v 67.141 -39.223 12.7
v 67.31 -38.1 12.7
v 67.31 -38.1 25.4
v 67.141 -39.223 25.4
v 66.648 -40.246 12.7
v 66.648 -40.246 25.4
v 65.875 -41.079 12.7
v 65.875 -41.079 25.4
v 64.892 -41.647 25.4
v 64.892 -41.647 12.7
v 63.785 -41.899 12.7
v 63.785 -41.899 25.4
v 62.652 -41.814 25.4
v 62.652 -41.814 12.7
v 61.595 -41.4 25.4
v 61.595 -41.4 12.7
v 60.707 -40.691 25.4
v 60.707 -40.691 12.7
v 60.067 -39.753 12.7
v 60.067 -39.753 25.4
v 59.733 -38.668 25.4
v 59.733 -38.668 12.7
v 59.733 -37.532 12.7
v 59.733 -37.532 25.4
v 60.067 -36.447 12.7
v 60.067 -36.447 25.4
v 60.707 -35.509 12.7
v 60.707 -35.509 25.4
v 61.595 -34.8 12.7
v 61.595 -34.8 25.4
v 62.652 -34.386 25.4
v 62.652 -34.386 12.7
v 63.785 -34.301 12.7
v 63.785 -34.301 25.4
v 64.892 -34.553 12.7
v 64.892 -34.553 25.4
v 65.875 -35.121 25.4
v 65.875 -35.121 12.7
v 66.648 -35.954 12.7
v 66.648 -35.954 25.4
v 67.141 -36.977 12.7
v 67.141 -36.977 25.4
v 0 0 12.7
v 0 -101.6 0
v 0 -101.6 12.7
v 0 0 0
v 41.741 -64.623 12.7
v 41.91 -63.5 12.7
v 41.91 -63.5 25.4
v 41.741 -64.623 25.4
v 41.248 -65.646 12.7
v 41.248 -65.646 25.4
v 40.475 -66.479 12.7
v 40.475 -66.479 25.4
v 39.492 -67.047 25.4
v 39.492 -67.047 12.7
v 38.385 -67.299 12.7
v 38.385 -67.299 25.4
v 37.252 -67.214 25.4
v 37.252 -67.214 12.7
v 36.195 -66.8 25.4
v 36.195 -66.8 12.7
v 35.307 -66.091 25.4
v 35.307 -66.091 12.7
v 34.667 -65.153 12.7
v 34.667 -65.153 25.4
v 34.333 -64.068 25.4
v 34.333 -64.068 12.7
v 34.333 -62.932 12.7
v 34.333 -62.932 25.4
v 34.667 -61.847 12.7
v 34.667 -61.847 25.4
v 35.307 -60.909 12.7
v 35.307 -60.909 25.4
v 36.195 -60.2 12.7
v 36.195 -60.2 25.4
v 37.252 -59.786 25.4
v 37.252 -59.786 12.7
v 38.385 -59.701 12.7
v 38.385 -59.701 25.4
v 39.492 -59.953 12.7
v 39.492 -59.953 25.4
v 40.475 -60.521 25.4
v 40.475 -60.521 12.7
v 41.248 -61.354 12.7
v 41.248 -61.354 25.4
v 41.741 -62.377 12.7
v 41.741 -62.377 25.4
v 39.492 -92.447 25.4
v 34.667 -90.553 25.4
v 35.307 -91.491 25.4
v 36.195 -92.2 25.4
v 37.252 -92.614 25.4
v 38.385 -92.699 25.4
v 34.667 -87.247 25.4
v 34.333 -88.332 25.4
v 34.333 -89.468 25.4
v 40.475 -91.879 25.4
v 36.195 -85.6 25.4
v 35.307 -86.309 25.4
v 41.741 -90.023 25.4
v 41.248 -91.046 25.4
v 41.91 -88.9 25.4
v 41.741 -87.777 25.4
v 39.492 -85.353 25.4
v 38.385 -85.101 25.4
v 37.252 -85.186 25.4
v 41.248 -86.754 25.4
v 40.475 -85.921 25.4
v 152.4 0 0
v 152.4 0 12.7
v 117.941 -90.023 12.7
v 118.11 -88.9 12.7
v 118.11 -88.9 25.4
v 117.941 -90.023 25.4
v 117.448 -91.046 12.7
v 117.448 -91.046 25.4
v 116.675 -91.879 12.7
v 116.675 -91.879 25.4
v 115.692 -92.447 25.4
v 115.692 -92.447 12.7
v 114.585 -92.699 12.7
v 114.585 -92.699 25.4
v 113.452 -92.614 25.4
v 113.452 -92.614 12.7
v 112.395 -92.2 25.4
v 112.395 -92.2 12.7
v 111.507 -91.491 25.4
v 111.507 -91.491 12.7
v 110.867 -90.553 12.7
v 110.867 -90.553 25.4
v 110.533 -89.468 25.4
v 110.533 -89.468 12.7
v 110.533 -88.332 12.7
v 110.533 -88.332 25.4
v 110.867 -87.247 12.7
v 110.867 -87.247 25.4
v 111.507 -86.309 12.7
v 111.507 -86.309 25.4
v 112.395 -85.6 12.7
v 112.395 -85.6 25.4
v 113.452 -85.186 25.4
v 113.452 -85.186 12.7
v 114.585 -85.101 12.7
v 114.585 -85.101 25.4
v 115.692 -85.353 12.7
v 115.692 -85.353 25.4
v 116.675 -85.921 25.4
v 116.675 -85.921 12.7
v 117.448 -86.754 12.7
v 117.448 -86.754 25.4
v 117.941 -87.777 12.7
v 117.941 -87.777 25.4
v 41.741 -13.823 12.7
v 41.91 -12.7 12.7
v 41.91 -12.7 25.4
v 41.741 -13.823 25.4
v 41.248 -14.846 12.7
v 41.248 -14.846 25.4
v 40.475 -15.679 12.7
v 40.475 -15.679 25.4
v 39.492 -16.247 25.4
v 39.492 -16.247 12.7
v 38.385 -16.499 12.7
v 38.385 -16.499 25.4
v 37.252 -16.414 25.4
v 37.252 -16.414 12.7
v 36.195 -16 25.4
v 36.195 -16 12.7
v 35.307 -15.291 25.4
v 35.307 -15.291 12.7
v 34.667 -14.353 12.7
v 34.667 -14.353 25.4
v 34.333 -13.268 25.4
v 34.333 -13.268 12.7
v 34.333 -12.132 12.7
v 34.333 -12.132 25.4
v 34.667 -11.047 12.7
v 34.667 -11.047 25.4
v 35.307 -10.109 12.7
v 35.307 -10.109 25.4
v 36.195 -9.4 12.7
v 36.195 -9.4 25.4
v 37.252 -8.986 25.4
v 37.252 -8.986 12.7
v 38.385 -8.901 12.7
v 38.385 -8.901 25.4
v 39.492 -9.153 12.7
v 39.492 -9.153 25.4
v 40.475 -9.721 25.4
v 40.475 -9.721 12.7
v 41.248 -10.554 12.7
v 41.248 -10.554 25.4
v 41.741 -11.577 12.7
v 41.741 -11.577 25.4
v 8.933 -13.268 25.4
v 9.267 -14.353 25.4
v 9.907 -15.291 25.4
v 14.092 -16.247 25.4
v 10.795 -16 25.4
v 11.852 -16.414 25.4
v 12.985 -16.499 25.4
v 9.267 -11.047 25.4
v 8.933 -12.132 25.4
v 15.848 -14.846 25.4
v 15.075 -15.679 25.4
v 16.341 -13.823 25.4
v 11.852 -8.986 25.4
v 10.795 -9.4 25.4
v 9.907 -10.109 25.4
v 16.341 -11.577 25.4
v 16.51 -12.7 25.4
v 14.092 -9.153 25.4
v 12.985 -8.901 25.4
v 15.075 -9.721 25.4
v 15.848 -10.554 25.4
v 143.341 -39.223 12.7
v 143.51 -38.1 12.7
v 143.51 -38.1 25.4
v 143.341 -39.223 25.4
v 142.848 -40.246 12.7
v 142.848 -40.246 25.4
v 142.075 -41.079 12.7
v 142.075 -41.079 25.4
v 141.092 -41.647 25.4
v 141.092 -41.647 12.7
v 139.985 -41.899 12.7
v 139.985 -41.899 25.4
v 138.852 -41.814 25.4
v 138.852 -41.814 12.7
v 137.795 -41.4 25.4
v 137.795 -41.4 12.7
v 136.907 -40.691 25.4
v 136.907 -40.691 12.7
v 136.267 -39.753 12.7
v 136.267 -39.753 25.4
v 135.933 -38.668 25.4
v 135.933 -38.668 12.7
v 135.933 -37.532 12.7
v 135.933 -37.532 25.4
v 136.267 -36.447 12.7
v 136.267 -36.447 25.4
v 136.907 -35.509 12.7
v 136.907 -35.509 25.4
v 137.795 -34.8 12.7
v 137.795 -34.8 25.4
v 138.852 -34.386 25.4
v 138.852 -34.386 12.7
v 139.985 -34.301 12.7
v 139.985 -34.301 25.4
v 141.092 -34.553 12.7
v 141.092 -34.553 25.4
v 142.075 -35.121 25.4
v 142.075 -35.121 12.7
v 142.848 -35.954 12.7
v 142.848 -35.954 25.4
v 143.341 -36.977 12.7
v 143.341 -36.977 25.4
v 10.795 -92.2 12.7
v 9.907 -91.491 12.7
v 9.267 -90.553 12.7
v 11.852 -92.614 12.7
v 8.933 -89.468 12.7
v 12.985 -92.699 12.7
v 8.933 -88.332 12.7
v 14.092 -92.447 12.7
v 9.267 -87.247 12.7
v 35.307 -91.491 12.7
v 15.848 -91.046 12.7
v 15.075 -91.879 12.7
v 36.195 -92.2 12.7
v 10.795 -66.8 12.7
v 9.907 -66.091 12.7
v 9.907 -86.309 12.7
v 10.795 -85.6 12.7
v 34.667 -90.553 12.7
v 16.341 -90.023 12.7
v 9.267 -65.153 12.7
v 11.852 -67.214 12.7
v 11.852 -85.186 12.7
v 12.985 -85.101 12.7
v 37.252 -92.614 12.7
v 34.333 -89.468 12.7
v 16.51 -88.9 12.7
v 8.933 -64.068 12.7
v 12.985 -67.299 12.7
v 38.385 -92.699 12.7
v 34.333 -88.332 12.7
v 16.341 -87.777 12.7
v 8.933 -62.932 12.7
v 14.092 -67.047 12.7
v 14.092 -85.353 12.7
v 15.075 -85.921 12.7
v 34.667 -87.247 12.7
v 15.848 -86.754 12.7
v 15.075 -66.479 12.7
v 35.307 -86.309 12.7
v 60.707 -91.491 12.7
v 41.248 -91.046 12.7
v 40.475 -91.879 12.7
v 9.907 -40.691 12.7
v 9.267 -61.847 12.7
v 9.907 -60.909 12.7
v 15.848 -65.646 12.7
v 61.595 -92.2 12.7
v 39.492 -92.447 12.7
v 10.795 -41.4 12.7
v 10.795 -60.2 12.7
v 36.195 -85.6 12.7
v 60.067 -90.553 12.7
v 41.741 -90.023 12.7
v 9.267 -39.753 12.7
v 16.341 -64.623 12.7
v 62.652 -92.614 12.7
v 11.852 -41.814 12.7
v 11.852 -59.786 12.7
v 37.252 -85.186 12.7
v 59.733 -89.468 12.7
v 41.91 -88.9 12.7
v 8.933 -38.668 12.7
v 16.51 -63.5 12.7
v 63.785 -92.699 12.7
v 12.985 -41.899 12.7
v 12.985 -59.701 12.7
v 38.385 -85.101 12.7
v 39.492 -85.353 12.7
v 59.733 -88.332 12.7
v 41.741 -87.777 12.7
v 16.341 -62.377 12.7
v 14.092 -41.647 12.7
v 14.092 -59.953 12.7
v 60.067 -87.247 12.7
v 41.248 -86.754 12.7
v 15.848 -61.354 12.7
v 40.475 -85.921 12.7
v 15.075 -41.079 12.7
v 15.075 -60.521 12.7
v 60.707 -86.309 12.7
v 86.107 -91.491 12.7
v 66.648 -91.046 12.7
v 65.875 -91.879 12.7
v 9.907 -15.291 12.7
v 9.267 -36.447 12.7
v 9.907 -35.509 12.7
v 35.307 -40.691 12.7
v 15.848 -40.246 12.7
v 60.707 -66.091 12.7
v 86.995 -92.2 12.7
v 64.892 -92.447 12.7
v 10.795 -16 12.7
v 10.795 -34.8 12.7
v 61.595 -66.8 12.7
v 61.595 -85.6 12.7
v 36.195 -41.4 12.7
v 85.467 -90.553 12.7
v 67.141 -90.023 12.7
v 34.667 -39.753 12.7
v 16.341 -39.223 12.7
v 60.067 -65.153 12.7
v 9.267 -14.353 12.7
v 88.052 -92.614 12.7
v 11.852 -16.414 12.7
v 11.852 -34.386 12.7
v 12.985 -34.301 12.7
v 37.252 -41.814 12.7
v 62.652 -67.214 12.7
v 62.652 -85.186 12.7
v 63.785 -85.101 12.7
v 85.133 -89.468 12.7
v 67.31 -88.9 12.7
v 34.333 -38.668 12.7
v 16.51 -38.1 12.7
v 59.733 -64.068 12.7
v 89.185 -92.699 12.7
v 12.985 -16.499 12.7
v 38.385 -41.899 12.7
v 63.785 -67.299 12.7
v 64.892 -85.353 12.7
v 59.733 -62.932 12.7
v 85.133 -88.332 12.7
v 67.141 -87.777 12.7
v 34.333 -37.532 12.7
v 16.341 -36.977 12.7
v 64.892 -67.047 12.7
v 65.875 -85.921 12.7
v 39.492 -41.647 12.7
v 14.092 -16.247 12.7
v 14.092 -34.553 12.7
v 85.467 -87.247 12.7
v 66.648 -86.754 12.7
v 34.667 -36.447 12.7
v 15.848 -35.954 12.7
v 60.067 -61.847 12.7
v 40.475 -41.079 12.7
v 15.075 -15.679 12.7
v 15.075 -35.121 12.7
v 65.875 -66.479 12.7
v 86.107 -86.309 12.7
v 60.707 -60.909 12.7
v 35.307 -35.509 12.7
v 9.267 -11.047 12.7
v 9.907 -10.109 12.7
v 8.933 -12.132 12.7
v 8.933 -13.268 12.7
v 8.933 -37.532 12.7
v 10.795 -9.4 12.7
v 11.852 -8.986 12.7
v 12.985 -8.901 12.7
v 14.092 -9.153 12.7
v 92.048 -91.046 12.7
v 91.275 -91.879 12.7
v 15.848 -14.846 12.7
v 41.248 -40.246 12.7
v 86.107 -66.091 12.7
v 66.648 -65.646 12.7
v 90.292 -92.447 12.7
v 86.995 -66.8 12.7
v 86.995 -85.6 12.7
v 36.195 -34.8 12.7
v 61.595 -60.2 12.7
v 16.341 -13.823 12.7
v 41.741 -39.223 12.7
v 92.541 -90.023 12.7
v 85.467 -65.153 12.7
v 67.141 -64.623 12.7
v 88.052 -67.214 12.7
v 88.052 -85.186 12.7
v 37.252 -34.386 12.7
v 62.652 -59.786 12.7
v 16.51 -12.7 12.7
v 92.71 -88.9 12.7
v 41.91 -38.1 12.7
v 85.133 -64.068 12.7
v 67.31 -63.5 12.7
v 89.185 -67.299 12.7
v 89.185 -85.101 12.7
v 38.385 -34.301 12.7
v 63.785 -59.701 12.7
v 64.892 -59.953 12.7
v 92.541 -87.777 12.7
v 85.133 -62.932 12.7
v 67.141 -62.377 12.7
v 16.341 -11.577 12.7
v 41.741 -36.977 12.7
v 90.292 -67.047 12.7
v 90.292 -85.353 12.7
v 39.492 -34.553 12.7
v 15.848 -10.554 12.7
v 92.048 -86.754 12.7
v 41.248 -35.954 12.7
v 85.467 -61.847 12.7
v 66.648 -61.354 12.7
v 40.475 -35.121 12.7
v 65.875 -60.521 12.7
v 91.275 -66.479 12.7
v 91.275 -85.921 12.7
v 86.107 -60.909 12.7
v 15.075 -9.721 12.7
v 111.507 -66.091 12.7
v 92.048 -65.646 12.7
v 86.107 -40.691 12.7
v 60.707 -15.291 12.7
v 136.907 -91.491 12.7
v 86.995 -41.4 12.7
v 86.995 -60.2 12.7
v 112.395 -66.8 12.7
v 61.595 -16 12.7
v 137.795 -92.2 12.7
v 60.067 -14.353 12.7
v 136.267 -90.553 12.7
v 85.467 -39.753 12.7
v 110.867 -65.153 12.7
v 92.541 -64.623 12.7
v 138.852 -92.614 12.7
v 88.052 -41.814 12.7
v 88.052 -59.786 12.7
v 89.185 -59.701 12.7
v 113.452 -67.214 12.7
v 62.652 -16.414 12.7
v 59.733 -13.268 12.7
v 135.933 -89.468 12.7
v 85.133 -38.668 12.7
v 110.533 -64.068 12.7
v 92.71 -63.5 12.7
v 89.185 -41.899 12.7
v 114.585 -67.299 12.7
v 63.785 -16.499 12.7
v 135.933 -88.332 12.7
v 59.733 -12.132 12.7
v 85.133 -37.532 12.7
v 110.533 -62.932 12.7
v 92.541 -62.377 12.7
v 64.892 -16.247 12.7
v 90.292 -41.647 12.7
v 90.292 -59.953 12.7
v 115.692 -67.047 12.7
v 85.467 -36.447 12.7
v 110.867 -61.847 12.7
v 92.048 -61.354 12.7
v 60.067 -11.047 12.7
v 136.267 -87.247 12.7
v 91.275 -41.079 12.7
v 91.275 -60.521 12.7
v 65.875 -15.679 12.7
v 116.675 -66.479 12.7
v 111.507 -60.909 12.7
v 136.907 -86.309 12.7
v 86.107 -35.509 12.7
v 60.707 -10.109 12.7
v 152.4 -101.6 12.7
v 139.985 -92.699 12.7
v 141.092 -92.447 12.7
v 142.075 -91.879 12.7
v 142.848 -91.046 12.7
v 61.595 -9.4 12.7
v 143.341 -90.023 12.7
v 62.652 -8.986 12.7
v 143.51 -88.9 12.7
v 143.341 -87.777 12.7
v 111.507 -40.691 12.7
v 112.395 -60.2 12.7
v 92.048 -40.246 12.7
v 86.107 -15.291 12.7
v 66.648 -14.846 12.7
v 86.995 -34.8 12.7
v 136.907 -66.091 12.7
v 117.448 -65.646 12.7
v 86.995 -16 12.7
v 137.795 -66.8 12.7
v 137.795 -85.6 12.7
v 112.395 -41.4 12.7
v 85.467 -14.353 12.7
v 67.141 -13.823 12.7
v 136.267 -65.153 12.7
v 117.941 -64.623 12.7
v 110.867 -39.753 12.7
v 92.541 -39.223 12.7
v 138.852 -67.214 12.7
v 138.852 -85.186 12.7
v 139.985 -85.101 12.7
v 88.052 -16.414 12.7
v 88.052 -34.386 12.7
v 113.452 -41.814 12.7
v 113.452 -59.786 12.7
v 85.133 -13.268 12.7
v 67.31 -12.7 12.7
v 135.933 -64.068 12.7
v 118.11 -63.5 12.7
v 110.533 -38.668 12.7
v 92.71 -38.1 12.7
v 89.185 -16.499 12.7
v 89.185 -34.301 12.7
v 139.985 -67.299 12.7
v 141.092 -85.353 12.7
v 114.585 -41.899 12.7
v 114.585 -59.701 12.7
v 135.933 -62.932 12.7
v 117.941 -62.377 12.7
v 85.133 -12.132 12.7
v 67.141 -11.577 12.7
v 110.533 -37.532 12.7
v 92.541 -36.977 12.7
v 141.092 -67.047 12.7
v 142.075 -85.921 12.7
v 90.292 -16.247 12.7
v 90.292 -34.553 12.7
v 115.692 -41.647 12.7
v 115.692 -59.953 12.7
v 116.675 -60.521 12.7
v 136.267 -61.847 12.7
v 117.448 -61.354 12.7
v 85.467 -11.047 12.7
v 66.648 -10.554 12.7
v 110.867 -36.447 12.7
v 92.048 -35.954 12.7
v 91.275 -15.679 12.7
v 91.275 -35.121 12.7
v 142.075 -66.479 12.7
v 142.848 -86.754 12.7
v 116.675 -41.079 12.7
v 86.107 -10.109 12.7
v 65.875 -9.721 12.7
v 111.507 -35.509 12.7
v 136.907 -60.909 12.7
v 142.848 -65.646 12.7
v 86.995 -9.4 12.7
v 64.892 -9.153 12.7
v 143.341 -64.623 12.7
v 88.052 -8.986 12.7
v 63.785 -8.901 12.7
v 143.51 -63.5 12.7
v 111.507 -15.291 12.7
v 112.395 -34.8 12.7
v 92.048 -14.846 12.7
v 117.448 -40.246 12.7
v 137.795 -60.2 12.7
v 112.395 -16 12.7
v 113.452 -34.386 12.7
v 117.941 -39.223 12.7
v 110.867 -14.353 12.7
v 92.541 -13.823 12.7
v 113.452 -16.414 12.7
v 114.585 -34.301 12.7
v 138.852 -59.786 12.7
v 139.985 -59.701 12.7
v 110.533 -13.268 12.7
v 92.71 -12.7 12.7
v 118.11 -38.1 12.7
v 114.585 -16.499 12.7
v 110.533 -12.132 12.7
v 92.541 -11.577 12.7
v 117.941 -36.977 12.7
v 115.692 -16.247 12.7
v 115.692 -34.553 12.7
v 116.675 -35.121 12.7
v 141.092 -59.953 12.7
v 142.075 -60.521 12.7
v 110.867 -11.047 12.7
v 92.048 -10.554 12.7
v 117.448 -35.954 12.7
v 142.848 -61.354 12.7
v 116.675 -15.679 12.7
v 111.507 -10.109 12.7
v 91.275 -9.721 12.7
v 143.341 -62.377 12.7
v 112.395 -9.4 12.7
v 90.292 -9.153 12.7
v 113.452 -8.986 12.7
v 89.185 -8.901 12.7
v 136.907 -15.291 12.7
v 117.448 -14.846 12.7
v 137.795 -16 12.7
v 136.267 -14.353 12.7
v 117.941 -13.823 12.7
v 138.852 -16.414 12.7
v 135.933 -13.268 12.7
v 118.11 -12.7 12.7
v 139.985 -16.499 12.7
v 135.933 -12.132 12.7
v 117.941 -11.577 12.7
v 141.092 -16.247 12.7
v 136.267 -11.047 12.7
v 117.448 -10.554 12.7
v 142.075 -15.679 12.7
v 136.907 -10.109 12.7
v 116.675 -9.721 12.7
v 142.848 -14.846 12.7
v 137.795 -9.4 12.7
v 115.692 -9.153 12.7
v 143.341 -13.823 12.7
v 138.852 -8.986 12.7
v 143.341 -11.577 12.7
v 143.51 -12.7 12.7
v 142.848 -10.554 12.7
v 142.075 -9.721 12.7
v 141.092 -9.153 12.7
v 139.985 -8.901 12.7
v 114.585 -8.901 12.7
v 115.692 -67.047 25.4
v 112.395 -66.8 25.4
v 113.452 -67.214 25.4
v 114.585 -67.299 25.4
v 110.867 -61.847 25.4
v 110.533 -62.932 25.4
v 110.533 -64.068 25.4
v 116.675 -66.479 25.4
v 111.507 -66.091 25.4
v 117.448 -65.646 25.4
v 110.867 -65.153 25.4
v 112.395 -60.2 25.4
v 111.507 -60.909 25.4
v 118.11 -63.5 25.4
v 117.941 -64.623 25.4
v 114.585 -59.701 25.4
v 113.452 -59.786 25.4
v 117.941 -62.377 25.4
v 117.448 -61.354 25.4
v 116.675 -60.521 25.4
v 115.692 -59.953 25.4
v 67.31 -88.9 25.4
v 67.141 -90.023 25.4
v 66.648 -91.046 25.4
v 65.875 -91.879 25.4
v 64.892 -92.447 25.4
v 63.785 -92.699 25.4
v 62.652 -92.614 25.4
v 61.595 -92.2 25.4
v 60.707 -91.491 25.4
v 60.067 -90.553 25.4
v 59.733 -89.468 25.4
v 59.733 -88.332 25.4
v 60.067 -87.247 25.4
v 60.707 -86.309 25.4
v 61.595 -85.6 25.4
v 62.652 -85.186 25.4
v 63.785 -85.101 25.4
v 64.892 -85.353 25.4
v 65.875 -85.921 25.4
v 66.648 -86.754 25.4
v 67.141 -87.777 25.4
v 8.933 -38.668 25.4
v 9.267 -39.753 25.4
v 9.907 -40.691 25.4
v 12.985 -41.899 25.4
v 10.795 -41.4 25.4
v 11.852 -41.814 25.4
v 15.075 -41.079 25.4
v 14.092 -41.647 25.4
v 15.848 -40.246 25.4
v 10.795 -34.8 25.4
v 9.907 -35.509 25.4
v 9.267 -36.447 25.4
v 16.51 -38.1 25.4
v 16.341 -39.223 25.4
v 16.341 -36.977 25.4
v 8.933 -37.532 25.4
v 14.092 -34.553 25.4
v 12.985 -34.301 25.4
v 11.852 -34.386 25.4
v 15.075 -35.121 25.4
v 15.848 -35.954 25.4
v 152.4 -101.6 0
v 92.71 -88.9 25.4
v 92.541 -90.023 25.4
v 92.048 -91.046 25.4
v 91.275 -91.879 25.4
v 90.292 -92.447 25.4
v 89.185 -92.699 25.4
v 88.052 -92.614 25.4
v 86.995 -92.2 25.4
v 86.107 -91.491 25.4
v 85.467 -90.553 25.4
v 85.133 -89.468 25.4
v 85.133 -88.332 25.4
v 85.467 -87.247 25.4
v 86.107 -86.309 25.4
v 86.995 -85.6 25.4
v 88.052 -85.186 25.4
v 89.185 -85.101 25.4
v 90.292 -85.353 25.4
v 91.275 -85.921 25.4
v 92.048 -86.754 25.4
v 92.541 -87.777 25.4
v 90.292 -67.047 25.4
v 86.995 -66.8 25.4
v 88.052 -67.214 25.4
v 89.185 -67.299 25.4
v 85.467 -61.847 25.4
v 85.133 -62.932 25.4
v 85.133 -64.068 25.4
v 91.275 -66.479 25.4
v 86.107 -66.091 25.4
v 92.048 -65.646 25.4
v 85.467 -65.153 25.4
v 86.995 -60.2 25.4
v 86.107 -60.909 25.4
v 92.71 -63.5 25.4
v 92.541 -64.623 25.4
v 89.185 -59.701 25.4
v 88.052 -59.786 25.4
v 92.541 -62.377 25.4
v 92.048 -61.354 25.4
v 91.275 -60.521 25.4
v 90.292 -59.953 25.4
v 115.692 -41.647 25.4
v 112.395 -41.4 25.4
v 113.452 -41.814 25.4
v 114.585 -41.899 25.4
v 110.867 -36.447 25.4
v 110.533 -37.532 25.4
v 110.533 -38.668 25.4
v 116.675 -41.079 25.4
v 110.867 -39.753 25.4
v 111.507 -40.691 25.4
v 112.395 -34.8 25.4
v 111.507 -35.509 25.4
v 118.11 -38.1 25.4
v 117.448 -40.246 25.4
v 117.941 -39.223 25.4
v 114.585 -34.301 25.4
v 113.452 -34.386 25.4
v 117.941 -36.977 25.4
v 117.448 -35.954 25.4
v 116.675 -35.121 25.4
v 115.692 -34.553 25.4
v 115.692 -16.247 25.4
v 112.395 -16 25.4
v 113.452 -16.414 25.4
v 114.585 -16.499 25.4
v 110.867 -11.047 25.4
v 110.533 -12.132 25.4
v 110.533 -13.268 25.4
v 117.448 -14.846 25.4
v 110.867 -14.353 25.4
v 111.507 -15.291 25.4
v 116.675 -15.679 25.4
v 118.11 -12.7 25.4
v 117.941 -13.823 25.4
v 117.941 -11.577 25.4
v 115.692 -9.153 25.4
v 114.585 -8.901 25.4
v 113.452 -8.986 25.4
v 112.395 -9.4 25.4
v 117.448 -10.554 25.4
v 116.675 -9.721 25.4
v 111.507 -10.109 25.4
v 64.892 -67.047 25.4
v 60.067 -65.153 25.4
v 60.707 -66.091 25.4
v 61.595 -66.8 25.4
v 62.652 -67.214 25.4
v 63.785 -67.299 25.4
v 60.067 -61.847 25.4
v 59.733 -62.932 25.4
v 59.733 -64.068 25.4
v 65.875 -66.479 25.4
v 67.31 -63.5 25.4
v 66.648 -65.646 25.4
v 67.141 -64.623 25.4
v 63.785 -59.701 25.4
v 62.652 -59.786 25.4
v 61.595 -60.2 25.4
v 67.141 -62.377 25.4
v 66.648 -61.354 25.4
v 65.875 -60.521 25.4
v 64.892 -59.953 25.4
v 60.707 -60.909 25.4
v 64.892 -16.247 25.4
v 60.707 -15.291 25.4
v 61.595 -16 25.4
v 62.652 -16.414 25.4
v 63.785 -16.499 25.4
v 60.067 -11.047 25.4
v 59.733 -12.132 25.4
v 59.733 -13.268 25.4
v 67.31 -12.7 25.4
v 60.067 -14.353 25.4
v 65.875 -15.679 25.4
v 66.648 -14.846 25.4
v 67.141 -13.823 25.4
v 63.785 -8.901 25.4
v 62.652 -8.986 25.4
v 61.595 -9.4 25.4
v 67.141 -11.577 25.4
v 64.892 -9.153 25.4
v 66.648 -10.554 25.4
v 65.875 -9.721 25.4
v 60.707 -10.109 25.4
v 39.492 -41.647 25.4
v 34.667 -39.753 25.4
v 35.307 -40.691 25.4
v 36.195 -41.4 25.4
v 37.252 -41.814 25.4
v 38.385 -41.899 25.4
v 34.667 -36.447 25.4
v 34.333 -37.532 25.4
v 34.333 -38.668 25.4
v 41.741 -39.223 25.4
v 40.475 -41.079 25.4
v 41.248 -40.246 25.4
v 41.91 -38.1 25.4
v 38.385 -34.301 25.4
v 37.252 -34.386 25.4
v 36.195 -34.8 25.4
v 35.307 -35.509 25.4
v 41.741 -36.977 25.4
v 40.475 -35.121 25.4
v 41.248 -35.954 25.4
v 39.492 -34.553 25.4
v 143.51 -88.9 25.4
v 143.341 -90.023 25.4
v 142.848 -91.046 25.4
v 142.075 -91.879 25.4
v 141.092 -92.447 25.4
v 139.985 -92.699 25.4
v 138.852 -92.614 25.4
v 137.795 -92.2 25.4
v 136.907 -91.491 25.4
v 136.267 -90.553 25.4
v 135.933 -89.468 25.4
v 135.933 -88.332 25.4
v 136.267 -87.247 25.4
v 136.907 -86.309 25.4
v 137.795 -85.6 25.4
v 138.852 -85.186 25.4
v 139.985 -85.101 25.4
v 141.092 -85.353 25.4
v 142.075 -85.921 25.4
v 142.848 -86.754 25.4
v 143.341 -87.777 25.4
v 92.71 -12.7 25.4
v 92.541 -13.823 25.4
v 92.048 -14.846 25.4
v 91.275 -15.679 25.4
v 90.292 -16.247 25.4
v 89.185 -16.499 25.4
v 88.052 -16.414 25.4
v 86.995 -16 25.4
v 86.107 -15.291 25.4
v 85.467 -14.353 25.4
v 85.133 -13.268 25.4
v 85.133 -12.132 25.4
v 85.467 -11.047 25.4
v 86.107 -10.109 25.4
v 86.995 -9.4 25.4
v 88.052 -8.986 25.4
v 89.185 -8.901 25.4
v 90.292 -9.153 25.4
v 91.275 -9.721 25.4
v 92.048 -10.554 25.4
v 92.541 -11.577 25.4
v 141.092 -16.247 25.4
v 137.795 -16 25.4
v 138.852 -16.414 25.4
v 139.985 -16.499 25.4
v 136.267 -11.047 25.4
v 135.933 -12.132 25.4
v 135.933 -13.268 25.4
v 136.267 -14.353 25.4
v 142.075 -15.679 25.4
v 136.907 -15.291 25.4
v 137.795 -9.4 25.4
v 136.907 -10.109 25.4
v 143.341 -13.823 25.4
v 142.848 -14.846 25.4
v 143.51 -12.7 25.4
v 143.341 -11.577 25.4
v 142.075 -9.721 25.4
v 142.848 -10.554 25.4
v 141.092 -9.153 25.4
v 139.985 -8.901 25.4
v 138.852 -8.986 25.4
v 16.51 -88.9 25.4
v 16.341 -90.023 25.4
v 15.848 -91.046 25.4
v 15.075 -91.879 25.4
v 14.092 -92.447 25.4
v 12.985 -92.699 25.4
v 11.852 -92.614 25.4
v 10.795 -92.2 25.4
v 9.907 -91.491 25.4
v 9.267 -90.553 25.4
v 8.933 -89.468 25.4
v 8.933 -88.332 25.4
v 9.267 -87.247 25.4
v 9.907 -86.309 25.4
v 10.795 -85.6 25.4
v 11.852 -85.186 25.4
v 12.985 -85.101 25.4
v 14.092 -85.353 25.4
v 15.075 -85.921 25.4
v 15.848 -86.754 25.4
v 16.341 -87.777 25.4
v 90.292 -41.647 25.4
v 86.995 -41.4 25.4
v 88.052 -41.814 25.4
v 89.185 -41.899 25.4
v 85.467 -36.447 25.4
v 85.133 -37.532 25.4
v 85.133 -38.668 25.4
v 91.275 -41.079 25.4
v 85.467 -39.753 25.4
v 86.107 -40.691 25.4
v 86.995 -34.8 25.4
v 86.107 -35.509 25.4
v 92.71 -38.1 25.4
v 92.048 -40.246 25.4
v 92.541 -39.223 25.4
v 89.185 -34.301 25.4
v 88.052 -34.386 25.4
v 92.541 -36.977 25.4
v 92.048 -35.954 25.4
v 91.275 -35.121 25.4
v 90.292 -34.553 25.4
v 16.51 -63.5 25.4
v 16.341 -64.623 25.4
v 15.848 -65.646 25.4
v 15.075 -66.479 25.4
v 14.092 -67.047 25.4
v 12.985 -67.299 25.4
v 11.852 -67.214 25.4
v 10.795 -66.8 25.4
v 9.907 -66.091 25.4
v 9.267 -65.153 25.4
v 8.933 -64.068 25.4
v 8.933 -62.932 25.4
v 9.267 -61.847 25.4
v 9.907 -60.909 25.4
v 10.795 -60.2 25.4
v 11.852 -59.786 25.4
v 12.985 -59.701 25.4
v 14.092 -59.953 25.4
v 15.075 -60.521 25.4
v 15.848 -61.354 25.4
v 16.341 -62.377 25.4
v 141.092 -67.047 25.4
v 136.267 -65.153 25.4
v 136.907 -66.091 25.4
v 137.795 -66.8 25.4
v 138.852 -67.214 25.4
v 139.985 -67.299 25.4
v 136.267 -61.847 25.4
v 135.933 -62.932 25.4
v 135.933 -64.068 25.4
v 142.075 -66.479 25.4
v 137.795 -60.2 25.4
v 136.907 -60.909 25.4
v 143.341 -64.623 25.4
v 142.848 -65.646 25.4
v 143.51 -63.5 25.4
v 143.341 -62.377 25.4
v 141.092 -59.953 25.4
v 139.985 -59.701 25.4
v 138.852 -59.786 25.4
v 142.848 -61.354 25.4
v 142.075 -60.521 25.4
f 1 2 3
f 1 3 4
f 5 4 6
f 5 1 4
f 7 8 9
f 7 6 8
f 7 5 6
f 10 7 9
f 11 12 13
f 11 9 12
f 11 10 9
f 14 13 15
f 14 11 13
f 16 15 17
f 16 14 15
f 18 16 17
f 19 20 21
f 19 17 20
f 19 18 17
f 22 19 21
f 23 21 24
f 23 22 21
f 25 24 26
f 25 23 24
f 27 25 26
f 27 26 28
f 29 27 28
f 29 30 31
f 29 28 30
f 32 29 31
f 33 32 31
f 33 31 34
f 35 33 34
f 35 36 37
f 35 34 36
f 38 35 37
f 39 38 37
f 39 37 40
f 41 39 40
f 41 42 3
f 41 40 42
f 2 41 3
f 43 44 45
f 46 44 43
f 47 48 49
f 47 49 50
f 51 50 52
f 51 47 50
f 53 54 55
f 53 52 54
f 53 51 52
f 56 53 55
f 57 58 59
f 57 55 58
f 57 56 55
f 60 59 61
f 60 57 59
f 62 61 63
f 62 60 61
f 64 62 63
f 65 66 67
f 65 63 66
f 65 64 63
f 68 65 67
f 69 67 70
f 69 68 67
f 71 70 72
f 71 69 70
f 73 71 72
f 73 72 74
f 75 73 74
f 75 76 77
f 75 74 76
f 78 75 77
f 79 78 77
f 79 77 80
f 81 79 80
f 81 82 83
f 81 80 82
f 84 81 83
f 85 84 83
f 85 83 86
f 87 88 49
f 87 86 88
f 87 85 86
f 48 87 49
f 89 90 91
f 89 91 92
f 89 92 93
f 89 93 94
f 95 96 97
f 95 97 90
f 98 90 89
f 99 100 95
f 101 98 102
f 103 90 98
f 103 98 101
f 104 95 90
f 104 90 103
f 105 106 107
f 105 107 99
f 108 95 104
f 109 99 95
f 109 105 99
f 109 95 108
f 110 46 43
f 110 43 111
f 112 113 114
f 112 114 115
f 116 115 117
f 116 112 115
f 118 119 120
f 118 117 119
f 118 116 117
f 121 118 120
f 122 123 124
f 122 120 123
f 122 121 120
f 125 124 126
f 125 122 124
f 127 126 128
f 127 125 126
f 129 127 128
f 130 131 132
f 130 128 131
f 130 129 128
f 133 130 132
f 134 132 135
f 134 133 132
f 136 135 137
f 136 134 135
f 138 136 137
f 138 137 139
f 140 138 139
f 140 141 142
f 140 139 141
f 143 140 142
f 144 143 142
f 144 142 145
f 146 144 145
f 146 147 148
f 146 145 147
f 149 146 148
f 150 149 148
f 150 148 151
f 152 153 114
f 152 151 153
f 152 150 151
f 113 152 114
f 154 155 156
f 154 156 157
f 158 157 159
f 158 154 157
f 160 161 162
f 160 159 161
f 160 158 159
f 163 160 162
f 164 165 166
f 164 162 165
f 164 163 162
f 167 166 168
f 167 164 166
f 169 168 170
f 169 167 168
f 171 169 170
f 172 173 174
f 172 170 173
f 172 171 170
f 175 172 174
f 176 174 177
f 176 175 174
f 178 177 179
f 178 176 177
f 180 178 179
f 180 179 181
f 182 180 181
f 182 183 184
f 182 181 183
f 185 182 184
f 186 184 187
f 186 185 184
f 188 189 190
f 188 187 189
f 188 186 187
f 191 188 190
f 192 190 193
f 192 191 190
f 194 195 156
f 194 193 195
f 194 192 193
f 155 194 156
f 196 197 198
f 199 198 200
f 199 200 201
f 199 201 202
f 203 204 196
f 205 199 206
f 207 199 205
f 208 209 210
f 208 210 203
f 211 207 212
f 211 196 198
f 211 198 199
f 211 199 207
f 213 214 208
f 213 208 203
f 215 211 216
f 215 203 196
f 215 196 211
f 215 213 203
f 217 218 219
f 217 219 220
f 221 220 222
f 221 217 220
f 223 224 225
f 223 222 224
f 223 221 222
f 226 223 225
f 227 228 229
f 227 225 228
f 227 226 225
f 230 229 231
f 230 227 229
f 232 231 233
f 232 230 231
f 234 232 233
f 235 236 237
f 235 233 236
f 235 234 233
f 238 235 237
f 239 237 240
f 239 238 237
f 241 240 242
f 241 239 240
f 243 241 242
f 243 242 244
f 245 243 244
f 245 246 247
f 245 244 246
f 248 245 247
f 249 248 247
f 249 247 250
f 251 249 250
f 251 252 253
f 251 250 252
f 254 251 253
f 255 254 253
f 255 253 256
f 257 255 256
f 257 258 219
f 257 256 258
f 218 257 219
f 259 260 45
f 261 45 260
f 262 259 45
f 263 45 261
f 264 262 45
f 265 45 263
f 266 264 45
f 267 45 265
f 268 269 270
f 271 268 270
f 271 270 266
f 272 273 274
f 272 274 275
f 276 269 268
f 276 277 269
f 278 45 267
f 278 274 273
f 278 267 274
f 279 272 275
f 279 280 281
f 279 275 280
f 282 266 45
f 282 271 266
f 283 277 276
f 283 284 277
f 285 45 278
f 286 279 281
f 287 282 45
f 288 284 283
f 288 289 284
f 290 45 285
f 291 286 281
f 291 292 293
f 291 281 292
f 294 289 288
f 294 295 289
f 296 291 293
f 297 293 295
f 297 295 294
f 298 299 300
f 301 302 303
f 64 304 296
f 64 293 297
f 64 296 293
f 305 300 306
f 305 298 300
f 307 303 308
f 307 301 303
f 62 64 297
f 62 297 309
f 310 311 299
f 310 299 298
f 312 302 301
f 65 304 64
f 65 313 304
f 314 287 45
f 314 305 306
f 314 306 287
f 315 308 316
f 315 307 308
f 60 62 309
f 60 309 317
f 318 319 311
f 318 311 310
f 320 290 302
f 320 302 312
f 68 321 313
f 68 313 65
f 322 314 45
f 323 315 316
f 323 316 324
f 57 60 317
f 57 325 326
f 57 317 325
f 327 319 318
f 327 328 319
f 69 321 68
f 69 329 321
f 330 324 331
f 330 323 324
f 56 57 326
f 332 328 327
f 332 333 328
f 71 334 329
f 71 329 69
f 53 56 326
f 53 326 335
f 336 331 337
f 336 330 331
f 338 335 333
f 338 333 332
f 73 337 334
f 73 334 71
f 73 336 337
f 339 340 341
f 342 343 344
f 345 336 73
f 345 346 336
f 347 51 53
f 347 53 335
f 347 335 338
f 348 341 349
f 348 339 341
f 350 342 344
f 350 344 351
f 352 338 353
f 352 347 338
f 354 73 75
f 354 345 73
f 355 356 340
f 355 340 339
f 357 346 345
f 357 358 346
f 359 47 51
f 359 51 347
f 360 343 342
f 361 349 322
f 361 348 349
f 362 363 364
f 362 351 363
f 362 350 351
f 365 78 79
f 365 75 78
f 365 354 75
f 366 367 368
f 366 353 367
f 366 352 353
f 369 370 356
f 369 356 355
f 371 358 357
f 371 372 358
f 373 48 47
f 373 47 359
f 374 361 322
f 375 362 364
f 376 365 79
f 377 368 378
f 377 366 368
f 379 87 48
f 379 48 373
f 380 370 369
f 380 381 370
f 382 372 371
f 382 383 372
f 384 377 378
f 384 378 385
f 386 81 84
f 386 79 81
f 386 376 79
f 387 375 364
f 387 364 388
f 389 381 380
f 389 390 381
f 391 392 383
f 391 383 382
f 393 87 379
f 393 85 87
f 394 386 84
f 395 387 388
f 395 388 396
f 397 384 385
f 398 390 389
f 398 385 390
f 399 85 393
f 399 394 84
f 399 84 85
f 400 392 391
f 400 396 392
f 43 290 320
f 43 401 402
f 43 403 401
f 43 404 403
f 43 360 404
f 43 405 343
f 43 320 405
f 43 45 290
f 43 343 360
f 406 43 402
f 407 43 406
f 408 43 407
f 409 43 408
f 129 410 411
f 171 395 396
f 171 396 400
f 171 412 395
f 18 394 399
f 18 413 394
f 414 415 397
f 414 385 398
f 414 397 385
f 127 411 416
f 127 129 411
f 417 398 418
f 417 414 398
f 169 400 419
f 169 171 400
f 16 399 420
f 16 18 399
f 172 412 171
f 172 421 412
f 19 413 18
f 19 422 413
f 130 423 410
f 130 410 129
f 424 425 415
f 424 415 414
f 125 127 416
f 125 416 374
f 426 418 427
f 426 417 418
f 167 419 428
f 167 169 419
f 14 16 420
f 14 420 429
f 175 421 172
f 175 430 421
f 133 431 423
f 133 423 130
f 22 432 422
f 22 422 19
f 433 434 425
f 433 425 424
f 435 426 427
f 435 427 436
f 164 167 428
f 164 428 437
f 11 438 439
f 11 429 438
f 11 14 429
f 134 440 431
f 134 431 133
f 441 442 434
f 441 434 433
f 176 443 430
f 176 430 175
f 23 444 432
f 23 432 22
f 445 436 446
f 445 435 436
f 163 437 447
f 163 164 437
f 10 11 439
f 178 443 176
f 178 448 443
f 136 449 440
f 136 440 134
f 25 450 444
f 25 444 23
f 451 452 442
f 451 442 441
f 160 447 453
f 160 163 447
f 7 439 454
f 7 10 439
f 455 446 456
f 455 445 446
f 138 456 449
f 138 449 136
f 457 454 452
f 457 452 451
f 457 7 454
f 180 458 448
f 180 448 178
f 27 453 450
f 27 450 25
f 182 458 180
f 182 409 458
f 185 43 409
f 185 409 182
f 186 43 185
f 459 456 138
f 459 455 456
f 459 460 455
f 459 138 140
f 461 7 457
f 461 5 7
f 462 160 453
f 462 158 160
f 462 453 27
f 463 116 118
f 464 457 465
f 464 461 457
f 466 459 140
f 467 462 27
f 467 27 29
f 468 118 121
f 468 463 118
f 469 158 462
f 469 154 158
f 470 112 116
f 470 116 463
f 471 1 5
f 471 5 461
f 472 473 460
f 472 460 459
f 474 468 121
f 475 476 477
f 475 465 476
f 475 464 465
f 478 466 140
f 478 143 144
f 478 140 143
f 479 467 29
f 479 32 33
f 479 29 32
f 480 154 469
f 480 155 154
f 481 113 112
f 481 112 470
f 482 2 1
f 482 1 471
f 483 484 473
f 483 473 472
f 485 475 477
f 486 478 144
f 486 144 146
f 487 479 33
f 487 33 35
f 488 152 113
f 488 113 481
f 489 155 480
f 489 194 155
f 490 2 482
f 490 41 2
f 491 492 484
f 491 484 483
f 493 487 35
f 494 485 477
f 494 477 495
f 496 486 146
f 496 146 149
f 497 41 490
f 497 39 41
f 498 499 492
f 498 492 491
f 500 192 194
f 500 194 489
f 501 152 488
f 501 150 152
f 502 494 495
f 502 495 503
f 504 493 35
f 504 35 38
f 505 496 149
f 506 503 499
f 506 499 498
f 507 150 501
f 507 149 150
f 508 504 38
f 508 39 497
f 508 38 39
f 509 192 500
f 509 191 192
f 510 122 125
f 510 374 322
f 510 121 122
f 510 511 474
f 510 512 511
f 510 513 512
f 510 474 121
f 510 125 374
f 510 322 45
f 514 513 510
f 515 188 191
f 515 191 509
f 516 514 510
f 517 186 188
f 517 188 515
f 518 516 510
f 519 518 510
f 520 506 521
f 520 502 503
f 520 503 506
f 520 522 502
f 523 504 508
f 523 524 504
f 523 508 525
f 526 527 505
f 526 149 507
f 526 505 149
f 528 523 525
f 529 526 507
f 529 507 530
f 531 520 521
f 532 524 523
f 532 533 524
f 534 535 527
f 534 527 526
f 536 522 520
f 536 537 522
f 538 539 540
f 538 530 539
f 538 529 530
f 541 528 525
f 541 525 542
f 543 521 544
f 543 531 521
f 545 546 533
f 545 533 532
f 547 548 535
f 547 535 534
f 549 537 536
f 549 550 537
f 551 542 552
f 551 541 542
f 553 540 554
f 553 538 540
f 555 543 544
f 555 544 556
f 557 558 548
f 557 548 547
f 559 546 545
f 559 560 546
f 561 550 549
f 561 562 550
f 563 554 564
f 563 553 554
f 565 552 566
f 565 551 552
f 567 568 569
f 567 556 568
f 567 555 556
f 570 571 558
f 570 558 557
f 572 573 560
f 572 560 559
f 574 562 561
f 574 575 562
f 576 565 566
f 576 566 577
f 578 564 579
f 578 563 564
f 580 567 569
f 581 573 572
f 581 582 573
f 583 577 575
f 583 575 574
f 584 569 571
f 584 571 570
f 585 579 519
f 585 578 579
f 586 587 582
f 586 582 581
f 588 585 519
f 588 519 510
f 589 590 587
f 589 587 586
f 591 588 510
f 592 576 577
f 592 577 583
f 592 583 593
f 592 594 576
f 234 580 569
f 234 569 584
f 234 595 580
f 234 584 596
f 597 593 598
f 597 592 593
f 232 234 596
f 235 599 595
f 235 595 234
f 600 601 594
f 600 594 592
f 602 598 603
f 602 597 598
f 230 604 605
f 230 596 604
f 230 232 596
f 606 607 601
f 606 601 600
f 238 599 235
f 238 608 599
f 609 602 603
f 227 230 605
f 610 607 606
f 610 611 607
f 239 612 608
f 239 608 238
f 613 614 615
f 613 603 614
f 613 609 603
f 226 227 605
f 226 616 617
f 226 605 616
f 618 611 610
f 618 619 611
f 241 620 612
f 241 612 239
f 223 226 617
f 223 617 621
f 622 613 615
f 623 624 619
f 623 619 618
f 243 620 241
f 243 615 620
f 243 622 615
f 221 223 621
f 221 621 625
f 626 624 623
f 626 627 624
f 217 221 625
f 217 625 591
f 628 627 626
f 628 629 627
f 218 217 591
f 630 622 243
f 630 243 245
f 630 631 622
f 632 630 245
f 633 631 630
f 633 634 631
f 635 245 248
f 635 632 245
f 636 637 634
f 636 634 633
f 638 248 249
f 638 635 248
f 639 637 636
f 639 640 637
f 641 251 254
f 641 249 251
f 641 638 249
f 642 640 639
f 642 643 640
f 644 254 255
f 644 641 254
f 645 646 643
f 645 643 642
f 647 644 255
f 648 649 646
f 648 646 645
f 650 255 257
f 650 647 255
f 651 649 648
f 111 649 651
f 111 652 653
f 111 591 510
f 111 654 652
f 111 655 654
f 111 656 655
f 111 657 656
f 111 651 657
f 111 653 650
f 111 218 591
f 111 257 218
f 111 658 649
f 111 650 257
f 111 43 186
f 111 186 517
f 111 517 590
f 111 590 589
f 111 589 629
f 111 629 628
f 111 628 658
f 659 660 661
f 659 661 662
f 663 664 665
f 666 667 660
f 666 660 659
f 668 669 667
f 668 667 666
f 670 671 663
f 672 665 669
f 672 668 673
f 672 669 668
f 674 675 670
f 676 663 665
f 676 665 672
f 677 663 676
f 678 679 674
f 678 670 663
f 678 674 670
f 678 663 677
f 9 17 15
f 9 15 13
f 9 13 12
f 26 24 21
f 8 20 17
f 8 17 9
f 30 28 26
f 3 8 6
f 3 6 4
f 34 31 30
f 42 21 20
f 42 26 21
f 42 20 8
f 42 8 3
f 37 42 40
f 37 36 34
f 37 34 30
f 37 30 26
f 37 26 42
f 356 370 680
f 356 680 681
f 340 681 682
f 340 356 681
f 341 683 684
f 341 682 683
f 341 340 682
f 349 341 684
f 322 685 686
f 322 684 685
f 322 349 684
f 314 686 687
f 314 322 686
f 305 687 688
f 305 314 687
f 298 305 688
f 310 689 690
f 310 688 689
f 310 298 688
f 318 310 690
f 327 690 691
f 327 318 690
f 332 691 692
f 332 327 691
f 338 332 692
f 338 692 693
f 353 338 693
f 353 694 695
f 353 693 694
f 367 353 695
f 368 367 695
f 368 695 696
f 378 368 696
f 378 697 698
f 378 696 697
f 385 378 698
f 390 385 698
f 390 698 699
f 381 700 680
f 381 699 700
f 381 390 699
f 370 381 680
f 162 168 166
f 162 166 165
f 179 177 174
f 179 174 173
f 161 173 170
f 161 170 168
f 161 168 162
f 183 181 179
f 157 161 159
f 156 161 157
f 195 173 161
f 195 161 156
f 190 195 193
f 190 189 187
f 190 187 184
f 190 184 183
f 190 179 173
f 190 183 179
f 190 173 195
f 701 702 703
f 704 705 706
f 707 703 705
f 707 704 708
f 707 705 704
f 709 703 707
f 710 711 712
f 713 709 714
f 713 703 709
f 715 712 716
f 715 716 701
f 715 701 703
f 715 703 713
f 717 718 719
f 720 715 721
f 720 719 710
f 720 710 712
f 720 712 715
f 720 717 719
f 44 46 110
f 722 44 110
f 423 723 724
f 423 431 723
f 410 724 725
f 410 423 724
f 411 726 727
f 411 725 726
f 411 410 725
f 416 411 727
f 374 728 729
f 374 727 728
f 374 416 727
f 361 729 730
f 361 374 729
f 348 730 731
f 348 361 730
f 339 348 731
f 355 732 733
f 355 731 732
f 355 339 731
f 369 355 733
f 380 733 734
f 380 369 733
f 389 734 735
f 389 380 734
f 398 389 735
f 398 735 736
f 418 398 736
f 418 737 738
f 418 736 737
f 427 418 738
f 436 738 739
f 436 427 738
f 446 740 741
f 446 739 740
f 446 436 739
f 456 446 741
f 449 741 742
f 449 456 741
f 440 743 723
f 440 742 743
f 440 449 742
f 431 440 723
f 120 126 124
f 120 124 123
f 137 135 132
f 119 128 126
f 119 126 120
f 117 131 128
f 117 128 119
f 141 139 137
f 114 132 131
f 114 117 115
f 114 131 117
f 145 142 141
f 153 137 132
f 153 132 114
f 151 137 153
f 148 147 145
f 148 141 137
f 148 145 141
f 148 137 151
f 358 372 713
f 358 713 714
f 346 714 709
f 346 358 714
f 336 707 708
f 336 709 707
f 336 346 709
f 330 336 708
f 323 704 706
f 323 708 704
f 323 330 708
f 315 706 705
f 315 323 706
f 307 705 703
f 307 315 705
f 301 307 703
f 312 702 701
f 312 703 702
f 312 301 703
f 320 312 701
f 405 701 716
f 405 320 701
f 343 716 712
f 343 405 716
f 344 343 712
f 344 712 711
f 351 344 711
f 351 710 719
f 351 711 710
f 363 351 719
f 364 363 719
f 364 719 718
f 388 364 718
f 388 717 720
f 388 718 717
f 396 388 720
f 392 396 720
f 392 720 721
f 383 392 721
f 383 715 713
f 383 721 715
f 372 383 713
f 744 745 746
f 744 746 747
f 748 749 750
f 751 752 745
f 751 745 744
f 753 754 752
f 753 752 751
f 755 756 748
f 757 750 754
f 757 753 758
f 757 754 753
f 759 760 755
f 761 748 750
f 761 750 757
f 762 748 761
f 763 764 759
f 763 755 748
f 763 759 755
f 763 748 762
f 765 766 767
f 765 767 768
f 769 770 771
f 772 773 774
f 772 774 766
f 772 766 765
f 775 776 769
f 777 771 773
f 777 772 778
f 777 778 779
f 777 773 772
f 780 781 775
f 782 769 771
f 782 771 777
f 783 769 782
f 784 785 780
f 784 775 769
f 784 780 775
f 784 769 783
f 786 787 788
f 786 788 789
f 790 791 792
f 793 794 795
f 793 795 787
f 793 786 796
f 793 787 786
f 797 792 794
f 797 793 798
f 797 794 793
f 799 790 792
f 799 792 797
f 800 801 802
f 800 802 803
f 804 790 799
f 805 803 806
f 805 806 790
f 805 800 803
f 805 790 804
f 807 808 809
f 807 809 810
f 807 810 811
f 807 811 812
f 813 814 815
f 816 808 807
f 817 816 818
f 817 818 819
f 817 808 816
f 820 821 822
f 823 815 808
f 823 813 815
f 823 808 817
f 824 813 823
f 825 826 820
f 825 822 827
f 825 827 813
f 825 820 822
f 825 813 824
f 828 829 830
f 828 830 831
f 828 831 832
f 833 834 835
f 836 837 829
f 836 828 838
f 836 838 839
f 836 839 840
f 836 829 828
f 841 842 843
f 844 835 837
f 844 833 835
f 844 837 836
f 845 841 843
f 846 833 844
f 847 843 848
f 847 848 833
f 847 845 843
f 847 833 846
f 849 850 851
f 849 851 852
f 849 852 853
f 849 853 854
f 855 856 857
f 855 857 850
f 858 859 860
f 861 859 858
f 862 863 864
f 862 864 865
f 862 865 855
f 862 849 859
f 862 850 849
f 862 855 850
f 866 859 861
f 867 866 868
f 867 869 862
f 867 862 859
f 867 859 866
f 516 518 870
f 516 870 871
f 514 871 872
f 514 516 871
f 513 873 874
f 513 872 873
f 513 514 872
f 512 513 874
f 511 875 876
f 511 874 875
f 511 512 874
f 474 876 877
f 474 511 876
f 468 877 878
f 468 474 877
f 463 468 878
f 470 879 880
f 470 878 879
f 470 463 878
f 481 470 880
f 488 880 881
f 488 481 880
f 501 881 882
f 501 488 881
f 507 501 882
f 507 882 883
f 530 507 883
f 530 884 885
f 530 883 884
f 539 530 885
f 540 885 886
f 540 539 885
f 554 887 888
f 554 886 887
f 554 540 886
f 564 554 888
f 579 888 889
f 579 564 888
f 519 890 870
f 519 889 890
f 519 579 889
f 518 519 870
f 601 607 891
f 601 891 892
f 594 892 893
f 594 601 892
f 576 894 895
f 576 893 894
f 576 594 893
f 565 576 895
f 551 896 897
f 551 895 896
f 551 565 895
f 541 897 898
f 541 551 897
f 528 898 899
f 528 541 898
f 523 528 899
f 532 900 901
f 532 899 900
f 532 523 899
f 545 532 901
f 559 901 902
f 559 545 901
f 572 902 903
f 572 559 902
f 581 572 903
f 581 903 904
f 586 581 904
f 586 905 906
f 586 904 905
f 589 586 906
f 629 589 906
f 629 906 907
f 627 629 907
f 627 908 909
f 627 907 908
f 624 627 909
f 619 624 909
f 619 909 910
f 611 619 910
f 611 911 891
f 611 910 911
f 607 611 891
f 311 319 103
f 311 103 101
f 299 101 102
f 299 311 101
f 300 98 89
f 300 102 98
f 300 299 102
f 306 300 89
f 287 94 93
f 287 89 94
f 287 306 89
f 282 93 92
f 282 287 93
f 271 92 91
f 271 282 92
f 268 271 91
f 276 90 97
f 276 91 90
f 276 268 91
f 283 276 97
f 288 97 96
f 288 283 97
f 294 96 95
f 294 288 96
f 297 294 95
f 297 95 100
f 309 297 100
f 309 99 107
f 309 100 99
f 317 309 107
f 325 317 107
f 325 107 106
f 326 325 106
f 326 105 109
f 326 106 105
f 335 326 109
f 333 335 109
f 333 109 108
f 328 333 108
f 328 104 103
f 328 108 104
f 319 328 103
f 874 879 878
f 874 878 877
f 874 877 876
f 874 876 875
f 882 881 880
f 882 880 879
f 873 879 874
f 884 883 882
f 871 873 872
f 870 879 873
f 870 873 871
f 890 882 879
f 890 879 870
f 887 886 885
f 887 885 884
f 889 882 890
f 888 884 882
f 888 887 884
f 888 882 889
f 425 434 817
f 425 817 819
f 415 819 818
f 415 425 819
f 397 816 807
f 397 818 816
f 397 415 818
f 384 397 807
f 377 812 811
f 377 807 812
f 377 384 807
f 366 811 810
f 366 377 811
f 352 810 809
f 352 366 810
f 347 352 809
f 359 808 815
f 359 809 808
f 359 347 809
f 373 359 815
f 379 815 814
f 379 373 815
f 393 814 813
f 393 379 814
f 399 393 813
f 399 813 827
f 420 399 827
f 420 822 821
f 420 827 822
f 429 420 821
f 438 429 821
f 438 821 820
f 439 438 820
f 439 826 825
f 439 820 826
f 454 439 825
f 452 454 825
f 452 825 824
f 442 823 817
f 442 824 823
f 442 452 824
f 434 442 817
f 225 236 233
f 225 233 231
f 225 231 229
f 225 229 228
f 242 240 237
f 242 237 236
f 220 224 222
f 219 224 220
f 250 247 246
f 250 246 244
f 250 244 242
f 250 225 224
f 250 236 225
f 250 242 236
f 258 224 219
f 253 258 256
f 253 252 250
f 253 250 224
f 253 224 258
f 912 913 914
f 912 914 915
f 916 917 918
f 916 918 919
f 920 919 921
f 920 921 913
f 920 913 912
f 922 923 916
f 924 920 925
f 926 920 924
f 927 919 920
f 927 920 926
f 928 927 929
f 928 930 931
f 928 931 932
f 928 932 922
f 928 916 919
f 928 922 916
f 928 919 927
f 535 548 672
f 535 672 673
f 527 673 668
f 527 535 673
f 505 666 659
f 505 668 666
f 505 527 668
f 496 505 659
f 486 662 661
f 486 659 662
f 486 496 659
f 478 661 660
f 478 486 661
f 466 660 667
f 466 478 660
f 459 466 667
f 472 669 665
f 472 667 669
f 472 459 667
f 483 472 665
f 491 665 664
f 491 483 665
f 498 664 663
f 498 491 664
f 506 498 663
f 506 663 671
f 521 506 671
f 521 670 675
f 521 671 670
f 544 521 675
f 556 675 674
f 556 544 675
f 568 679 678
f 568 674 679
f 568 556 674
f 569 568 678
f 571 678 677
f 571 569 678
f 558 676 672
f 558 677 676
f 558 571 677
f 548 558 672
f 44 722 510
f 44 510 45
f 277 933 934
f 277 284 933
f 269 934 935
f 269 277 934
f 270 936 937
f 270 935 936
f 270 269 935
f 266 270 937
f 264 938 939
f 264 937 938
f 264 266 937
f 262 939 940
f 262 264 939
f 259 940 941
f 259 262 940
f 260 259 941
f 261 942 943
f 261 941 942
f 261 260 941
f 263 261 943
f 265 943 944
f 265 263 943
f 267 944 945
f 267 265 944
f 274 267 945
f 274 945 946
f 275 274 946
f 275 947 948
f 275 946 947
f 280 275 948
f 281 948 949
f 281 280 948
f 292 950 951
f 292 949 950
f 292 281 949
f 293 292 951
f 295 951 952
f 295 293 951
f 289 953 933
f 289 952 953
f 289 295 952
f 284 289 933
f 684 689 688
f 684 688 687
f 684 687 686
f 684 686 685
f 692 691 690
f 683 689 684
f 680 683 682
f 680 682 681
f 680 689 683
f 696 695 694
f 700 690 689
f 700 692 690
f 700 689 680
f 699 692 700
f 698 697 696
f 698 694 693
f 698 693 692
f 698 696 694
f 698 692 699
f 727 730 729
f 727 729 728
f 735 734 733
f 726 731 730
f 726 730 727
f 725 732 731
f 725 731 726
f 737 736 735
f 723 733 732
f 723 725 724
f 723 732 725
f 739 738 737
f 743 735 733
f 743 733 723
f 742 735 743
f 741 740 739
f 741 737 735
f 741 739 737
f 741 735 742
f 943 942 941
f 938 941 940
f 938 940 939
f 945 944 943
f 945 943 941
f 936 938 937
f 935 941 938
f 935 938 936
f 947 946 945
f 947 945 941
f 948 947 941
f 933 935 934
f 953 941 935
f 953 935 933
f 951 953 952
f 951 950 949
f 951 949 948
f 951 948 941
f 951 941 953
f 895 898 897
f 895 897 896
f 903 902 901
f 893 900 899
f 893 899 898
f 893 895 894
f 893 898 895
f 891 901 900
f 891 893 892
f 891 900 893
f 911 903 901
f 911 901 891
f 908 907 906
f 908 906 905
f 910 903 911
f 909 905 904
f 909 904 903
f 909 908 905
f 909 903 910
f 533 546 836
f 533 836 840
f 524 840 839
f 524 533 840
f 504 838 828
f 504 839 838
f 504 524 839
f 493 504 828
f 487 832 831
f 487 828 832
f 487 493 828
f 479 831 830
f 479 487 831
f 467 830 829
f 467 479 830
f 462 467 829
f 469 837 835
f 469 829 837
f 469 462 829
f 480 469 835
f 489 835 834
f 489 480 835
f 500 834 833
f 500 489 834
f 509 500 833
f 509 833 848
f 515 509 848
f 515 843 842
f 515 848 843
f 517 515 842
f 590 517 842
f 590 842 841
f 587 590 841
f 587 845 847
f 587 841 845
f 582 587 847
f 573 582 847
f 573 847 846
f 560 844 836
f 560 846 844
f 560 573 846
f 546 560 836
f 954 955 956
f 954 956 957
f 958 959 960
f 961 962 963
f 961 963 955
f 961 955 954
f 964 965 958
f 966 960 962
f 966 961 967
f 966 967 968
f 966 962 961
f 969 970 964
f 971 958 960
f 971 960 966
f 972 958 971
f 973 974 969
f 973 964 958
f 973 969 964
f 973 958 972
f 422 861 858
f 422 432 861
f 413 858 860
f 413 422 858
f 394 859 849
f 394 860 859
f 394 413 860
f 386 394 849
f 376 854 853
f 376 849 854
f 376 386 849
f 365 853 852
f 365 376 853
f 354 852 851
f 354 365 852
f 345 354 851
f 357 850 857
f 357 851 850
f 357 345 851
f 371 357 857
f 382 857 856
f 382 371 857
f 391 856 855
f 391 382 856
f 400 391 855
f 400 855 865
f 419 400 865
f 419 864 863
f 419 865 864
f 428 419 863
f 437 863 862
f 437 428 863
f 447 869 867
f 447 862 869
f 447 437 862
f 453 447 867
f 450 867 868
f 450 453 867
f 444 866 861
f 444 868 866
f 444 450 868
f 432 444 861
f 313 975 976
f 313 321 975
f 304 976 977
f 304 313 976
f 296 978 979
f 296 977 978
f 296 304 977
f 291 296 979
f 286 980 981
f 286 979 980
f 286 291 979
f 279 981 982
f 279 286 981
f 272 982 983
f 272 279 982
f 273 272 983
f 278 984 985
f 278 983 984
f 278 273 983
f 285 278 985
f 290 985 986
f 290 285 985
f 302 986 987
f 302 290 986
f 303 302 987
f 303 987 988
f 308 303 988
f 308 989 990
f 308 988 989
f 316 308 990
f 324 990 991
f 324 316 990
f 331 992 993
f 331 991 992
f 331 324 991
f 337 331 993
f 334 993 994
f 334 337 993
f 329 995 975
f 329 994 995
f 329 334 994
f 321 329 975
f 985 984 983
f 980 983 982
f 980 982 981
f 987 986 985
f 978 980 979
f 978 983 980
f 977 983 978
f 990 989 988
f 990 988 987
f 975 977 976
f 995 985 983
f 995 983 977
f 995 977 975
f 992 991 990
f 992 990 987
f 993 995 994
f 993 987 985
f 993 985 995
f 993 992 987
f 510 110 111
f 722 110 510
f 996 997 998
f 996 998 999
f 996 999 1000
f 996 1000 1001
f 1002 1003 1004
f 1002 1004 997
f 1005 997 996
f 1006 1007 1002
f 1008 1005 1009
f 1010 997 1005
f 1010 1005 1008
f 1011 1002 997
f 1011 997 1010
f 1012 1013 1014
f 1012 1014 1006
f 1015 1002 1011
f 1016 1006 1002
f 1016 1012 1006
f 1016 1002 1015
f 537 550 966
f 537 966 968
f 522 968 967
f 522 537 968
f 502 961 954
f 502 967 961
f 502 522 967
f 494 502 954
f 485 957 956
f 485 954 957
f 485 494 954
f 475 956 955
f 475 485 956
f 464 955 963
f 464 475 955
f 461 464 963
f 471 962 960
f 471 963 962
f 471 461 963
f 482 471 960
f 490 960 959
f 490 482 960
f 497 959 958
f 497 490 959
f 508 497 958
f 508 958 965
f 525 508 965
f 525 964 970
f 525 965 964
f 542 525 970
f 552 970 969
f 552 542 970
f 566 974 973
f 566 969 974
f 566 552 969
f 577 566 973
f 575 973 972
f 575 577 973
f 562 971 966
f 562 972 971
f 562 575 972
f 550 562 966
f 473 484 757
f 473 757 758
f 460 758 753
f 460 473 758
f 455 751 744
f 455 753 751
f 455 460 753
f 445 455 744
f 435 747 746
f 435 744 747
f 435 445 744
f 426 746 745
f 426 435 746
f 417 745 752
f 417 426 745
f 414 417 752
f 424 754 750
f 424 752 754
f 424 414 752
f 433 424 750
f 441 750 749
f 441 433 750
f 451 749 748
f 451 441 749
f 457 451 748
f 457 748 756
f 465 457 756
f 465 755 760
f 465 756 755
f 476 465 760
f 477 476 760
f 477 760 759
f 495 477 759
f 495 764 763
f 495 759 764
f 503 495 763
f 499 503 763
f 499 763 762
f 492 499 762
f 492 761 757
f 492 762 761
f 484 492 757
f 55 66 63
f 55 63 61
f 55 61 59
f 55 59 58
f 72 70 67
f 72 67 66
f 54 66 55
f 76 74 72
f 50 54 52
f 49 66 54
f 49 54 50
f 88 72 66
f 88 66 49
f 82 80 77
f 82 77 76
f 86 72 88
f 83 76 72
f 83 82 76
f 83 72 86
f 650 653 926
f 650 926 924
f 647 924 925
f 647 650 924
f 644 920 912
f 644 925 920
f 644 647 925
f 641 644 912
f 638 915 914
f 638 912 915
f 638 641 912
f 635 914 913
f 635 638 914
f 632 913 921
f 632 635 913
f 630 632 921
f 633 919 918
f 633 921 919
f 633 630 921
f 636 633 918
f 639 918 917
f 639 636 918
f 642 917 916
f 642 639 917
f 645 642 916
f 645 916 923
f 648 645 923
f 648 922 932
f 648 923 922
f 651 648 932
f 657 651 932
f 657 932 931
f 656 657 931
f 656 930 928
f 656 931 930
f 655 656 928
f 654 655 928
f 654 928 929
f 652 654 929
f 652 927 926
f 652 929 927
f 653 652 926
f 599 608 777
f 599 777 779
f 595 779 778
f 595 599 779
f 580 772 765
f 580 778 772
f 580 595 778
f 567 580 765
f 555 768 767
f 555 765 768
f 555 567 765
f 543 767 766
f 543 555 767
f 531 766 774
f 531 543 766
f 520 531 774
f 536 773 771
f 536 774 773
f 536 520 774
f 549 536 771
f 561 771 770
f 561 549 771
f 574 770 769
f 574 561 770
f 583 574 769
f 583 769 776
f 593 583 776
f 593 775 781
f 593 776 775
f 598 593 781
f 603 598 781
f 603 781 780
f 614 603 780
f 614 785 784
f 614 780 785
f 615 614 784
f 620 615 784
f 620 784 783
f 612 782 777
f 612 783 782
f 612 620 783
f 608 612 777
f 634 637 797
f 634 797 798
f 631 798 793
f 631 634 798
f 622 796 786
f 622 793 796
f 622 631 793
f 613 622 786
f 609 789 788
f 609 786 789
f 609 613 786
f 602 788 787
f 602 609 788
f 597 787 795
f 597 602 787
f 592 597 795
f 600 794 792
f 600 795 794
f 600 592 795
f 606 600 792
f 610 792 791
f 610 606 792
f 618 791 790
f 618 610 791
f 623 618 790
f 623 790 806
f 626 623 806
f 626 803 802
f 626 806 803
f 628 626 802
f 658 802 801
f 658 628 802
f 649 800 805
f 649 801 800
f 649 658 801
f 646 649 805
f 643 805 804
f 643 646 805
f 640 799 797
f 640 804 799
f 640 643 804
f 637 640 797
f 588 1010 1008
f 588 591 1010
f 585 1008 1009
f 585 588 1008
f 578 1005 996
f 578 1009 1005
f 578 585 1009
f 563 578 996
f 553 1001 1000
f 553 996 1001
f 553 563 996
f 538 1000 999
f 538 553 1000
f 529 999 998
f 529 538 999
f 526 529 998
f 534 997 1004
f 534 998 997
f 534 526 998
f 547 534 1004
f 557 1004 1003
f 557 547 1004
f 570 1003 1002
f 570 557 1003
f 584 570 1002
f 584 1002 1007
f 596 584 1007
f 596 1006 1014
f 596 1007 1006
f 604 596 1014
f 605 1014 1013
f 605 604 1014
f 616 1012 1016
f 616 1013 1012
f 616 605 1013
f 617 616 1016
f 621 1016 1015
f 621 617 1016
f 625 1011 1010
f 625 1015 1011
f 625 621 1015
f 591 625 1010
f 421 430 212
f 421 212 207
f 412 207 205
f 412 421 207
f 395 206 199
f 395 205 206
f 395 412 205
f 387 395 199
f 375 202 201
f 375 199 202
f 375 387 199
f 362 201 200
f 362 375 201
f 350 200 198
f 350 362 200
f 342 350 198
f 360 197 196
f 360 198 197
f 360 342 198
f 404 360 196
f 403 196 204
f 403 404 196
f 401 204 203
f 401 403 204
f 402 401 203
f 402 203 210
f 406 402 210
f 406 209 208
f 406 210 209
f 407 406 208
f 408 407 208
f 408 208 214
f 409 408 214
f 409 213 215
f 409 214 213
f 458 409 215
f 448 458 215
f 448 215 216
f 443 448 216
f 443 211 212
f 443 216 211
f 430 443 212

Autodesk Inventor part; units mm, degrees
ref_plane "YZ Plane" through (0, 0, 0) normal (1, 0, 0) x (0, 1, 0)
ref_plane "XZ Plane" through (0, 0, 0) normal (0, 1, 0) x (-1, 0, 0)
ref_plane "XY Plane" through (0, 0, 0) normal (0, 0, 1) x (1, 0, 0)
sketch "Sketch1" plane through (0, 0, 0) normal (0, 0, 1) x (1, 0, 0)
  line L0 (0, 0) -> (152.4, 0)
  line L1 (152.4, 0) -> (152.4, -101.6)
  line L2 (152.4, -101.6) -> (0, -101.6)
  line L3 (0, -101.6) -> (0, 0)
  dimension "d0" = 152.4
  dimension "d1" = 101.6
extrude "Extrusion1" add sketch "Sketch1" along normal blind 12.7
sketch "Sketch2" plane through (0, 0, 12.7) normal (0, 0, 1) x (1, 0, 0)
  circle A0 centre (12.7, -12.7) radius 3.81
  line L0 (0, 0) -> (0, -101.6) projected
  line L1 (152.4, 0) -> (0, 0) projected
  dimension "d4" = 7.62
  dimension "d5" = 12.7
  dimension "d6" = 12.7
extrude "Extrusion2" add sketch "Sketch2" along normal blind 12.7
pattern_linear "Rectangular Pattern1" count 4 spacing 25.4 along (0, -1, 0) count 6 spacing 25.4 along (1, 0, 0) of "Extrusion2"
properties part number "AWRectangular Pattern5.5a"
